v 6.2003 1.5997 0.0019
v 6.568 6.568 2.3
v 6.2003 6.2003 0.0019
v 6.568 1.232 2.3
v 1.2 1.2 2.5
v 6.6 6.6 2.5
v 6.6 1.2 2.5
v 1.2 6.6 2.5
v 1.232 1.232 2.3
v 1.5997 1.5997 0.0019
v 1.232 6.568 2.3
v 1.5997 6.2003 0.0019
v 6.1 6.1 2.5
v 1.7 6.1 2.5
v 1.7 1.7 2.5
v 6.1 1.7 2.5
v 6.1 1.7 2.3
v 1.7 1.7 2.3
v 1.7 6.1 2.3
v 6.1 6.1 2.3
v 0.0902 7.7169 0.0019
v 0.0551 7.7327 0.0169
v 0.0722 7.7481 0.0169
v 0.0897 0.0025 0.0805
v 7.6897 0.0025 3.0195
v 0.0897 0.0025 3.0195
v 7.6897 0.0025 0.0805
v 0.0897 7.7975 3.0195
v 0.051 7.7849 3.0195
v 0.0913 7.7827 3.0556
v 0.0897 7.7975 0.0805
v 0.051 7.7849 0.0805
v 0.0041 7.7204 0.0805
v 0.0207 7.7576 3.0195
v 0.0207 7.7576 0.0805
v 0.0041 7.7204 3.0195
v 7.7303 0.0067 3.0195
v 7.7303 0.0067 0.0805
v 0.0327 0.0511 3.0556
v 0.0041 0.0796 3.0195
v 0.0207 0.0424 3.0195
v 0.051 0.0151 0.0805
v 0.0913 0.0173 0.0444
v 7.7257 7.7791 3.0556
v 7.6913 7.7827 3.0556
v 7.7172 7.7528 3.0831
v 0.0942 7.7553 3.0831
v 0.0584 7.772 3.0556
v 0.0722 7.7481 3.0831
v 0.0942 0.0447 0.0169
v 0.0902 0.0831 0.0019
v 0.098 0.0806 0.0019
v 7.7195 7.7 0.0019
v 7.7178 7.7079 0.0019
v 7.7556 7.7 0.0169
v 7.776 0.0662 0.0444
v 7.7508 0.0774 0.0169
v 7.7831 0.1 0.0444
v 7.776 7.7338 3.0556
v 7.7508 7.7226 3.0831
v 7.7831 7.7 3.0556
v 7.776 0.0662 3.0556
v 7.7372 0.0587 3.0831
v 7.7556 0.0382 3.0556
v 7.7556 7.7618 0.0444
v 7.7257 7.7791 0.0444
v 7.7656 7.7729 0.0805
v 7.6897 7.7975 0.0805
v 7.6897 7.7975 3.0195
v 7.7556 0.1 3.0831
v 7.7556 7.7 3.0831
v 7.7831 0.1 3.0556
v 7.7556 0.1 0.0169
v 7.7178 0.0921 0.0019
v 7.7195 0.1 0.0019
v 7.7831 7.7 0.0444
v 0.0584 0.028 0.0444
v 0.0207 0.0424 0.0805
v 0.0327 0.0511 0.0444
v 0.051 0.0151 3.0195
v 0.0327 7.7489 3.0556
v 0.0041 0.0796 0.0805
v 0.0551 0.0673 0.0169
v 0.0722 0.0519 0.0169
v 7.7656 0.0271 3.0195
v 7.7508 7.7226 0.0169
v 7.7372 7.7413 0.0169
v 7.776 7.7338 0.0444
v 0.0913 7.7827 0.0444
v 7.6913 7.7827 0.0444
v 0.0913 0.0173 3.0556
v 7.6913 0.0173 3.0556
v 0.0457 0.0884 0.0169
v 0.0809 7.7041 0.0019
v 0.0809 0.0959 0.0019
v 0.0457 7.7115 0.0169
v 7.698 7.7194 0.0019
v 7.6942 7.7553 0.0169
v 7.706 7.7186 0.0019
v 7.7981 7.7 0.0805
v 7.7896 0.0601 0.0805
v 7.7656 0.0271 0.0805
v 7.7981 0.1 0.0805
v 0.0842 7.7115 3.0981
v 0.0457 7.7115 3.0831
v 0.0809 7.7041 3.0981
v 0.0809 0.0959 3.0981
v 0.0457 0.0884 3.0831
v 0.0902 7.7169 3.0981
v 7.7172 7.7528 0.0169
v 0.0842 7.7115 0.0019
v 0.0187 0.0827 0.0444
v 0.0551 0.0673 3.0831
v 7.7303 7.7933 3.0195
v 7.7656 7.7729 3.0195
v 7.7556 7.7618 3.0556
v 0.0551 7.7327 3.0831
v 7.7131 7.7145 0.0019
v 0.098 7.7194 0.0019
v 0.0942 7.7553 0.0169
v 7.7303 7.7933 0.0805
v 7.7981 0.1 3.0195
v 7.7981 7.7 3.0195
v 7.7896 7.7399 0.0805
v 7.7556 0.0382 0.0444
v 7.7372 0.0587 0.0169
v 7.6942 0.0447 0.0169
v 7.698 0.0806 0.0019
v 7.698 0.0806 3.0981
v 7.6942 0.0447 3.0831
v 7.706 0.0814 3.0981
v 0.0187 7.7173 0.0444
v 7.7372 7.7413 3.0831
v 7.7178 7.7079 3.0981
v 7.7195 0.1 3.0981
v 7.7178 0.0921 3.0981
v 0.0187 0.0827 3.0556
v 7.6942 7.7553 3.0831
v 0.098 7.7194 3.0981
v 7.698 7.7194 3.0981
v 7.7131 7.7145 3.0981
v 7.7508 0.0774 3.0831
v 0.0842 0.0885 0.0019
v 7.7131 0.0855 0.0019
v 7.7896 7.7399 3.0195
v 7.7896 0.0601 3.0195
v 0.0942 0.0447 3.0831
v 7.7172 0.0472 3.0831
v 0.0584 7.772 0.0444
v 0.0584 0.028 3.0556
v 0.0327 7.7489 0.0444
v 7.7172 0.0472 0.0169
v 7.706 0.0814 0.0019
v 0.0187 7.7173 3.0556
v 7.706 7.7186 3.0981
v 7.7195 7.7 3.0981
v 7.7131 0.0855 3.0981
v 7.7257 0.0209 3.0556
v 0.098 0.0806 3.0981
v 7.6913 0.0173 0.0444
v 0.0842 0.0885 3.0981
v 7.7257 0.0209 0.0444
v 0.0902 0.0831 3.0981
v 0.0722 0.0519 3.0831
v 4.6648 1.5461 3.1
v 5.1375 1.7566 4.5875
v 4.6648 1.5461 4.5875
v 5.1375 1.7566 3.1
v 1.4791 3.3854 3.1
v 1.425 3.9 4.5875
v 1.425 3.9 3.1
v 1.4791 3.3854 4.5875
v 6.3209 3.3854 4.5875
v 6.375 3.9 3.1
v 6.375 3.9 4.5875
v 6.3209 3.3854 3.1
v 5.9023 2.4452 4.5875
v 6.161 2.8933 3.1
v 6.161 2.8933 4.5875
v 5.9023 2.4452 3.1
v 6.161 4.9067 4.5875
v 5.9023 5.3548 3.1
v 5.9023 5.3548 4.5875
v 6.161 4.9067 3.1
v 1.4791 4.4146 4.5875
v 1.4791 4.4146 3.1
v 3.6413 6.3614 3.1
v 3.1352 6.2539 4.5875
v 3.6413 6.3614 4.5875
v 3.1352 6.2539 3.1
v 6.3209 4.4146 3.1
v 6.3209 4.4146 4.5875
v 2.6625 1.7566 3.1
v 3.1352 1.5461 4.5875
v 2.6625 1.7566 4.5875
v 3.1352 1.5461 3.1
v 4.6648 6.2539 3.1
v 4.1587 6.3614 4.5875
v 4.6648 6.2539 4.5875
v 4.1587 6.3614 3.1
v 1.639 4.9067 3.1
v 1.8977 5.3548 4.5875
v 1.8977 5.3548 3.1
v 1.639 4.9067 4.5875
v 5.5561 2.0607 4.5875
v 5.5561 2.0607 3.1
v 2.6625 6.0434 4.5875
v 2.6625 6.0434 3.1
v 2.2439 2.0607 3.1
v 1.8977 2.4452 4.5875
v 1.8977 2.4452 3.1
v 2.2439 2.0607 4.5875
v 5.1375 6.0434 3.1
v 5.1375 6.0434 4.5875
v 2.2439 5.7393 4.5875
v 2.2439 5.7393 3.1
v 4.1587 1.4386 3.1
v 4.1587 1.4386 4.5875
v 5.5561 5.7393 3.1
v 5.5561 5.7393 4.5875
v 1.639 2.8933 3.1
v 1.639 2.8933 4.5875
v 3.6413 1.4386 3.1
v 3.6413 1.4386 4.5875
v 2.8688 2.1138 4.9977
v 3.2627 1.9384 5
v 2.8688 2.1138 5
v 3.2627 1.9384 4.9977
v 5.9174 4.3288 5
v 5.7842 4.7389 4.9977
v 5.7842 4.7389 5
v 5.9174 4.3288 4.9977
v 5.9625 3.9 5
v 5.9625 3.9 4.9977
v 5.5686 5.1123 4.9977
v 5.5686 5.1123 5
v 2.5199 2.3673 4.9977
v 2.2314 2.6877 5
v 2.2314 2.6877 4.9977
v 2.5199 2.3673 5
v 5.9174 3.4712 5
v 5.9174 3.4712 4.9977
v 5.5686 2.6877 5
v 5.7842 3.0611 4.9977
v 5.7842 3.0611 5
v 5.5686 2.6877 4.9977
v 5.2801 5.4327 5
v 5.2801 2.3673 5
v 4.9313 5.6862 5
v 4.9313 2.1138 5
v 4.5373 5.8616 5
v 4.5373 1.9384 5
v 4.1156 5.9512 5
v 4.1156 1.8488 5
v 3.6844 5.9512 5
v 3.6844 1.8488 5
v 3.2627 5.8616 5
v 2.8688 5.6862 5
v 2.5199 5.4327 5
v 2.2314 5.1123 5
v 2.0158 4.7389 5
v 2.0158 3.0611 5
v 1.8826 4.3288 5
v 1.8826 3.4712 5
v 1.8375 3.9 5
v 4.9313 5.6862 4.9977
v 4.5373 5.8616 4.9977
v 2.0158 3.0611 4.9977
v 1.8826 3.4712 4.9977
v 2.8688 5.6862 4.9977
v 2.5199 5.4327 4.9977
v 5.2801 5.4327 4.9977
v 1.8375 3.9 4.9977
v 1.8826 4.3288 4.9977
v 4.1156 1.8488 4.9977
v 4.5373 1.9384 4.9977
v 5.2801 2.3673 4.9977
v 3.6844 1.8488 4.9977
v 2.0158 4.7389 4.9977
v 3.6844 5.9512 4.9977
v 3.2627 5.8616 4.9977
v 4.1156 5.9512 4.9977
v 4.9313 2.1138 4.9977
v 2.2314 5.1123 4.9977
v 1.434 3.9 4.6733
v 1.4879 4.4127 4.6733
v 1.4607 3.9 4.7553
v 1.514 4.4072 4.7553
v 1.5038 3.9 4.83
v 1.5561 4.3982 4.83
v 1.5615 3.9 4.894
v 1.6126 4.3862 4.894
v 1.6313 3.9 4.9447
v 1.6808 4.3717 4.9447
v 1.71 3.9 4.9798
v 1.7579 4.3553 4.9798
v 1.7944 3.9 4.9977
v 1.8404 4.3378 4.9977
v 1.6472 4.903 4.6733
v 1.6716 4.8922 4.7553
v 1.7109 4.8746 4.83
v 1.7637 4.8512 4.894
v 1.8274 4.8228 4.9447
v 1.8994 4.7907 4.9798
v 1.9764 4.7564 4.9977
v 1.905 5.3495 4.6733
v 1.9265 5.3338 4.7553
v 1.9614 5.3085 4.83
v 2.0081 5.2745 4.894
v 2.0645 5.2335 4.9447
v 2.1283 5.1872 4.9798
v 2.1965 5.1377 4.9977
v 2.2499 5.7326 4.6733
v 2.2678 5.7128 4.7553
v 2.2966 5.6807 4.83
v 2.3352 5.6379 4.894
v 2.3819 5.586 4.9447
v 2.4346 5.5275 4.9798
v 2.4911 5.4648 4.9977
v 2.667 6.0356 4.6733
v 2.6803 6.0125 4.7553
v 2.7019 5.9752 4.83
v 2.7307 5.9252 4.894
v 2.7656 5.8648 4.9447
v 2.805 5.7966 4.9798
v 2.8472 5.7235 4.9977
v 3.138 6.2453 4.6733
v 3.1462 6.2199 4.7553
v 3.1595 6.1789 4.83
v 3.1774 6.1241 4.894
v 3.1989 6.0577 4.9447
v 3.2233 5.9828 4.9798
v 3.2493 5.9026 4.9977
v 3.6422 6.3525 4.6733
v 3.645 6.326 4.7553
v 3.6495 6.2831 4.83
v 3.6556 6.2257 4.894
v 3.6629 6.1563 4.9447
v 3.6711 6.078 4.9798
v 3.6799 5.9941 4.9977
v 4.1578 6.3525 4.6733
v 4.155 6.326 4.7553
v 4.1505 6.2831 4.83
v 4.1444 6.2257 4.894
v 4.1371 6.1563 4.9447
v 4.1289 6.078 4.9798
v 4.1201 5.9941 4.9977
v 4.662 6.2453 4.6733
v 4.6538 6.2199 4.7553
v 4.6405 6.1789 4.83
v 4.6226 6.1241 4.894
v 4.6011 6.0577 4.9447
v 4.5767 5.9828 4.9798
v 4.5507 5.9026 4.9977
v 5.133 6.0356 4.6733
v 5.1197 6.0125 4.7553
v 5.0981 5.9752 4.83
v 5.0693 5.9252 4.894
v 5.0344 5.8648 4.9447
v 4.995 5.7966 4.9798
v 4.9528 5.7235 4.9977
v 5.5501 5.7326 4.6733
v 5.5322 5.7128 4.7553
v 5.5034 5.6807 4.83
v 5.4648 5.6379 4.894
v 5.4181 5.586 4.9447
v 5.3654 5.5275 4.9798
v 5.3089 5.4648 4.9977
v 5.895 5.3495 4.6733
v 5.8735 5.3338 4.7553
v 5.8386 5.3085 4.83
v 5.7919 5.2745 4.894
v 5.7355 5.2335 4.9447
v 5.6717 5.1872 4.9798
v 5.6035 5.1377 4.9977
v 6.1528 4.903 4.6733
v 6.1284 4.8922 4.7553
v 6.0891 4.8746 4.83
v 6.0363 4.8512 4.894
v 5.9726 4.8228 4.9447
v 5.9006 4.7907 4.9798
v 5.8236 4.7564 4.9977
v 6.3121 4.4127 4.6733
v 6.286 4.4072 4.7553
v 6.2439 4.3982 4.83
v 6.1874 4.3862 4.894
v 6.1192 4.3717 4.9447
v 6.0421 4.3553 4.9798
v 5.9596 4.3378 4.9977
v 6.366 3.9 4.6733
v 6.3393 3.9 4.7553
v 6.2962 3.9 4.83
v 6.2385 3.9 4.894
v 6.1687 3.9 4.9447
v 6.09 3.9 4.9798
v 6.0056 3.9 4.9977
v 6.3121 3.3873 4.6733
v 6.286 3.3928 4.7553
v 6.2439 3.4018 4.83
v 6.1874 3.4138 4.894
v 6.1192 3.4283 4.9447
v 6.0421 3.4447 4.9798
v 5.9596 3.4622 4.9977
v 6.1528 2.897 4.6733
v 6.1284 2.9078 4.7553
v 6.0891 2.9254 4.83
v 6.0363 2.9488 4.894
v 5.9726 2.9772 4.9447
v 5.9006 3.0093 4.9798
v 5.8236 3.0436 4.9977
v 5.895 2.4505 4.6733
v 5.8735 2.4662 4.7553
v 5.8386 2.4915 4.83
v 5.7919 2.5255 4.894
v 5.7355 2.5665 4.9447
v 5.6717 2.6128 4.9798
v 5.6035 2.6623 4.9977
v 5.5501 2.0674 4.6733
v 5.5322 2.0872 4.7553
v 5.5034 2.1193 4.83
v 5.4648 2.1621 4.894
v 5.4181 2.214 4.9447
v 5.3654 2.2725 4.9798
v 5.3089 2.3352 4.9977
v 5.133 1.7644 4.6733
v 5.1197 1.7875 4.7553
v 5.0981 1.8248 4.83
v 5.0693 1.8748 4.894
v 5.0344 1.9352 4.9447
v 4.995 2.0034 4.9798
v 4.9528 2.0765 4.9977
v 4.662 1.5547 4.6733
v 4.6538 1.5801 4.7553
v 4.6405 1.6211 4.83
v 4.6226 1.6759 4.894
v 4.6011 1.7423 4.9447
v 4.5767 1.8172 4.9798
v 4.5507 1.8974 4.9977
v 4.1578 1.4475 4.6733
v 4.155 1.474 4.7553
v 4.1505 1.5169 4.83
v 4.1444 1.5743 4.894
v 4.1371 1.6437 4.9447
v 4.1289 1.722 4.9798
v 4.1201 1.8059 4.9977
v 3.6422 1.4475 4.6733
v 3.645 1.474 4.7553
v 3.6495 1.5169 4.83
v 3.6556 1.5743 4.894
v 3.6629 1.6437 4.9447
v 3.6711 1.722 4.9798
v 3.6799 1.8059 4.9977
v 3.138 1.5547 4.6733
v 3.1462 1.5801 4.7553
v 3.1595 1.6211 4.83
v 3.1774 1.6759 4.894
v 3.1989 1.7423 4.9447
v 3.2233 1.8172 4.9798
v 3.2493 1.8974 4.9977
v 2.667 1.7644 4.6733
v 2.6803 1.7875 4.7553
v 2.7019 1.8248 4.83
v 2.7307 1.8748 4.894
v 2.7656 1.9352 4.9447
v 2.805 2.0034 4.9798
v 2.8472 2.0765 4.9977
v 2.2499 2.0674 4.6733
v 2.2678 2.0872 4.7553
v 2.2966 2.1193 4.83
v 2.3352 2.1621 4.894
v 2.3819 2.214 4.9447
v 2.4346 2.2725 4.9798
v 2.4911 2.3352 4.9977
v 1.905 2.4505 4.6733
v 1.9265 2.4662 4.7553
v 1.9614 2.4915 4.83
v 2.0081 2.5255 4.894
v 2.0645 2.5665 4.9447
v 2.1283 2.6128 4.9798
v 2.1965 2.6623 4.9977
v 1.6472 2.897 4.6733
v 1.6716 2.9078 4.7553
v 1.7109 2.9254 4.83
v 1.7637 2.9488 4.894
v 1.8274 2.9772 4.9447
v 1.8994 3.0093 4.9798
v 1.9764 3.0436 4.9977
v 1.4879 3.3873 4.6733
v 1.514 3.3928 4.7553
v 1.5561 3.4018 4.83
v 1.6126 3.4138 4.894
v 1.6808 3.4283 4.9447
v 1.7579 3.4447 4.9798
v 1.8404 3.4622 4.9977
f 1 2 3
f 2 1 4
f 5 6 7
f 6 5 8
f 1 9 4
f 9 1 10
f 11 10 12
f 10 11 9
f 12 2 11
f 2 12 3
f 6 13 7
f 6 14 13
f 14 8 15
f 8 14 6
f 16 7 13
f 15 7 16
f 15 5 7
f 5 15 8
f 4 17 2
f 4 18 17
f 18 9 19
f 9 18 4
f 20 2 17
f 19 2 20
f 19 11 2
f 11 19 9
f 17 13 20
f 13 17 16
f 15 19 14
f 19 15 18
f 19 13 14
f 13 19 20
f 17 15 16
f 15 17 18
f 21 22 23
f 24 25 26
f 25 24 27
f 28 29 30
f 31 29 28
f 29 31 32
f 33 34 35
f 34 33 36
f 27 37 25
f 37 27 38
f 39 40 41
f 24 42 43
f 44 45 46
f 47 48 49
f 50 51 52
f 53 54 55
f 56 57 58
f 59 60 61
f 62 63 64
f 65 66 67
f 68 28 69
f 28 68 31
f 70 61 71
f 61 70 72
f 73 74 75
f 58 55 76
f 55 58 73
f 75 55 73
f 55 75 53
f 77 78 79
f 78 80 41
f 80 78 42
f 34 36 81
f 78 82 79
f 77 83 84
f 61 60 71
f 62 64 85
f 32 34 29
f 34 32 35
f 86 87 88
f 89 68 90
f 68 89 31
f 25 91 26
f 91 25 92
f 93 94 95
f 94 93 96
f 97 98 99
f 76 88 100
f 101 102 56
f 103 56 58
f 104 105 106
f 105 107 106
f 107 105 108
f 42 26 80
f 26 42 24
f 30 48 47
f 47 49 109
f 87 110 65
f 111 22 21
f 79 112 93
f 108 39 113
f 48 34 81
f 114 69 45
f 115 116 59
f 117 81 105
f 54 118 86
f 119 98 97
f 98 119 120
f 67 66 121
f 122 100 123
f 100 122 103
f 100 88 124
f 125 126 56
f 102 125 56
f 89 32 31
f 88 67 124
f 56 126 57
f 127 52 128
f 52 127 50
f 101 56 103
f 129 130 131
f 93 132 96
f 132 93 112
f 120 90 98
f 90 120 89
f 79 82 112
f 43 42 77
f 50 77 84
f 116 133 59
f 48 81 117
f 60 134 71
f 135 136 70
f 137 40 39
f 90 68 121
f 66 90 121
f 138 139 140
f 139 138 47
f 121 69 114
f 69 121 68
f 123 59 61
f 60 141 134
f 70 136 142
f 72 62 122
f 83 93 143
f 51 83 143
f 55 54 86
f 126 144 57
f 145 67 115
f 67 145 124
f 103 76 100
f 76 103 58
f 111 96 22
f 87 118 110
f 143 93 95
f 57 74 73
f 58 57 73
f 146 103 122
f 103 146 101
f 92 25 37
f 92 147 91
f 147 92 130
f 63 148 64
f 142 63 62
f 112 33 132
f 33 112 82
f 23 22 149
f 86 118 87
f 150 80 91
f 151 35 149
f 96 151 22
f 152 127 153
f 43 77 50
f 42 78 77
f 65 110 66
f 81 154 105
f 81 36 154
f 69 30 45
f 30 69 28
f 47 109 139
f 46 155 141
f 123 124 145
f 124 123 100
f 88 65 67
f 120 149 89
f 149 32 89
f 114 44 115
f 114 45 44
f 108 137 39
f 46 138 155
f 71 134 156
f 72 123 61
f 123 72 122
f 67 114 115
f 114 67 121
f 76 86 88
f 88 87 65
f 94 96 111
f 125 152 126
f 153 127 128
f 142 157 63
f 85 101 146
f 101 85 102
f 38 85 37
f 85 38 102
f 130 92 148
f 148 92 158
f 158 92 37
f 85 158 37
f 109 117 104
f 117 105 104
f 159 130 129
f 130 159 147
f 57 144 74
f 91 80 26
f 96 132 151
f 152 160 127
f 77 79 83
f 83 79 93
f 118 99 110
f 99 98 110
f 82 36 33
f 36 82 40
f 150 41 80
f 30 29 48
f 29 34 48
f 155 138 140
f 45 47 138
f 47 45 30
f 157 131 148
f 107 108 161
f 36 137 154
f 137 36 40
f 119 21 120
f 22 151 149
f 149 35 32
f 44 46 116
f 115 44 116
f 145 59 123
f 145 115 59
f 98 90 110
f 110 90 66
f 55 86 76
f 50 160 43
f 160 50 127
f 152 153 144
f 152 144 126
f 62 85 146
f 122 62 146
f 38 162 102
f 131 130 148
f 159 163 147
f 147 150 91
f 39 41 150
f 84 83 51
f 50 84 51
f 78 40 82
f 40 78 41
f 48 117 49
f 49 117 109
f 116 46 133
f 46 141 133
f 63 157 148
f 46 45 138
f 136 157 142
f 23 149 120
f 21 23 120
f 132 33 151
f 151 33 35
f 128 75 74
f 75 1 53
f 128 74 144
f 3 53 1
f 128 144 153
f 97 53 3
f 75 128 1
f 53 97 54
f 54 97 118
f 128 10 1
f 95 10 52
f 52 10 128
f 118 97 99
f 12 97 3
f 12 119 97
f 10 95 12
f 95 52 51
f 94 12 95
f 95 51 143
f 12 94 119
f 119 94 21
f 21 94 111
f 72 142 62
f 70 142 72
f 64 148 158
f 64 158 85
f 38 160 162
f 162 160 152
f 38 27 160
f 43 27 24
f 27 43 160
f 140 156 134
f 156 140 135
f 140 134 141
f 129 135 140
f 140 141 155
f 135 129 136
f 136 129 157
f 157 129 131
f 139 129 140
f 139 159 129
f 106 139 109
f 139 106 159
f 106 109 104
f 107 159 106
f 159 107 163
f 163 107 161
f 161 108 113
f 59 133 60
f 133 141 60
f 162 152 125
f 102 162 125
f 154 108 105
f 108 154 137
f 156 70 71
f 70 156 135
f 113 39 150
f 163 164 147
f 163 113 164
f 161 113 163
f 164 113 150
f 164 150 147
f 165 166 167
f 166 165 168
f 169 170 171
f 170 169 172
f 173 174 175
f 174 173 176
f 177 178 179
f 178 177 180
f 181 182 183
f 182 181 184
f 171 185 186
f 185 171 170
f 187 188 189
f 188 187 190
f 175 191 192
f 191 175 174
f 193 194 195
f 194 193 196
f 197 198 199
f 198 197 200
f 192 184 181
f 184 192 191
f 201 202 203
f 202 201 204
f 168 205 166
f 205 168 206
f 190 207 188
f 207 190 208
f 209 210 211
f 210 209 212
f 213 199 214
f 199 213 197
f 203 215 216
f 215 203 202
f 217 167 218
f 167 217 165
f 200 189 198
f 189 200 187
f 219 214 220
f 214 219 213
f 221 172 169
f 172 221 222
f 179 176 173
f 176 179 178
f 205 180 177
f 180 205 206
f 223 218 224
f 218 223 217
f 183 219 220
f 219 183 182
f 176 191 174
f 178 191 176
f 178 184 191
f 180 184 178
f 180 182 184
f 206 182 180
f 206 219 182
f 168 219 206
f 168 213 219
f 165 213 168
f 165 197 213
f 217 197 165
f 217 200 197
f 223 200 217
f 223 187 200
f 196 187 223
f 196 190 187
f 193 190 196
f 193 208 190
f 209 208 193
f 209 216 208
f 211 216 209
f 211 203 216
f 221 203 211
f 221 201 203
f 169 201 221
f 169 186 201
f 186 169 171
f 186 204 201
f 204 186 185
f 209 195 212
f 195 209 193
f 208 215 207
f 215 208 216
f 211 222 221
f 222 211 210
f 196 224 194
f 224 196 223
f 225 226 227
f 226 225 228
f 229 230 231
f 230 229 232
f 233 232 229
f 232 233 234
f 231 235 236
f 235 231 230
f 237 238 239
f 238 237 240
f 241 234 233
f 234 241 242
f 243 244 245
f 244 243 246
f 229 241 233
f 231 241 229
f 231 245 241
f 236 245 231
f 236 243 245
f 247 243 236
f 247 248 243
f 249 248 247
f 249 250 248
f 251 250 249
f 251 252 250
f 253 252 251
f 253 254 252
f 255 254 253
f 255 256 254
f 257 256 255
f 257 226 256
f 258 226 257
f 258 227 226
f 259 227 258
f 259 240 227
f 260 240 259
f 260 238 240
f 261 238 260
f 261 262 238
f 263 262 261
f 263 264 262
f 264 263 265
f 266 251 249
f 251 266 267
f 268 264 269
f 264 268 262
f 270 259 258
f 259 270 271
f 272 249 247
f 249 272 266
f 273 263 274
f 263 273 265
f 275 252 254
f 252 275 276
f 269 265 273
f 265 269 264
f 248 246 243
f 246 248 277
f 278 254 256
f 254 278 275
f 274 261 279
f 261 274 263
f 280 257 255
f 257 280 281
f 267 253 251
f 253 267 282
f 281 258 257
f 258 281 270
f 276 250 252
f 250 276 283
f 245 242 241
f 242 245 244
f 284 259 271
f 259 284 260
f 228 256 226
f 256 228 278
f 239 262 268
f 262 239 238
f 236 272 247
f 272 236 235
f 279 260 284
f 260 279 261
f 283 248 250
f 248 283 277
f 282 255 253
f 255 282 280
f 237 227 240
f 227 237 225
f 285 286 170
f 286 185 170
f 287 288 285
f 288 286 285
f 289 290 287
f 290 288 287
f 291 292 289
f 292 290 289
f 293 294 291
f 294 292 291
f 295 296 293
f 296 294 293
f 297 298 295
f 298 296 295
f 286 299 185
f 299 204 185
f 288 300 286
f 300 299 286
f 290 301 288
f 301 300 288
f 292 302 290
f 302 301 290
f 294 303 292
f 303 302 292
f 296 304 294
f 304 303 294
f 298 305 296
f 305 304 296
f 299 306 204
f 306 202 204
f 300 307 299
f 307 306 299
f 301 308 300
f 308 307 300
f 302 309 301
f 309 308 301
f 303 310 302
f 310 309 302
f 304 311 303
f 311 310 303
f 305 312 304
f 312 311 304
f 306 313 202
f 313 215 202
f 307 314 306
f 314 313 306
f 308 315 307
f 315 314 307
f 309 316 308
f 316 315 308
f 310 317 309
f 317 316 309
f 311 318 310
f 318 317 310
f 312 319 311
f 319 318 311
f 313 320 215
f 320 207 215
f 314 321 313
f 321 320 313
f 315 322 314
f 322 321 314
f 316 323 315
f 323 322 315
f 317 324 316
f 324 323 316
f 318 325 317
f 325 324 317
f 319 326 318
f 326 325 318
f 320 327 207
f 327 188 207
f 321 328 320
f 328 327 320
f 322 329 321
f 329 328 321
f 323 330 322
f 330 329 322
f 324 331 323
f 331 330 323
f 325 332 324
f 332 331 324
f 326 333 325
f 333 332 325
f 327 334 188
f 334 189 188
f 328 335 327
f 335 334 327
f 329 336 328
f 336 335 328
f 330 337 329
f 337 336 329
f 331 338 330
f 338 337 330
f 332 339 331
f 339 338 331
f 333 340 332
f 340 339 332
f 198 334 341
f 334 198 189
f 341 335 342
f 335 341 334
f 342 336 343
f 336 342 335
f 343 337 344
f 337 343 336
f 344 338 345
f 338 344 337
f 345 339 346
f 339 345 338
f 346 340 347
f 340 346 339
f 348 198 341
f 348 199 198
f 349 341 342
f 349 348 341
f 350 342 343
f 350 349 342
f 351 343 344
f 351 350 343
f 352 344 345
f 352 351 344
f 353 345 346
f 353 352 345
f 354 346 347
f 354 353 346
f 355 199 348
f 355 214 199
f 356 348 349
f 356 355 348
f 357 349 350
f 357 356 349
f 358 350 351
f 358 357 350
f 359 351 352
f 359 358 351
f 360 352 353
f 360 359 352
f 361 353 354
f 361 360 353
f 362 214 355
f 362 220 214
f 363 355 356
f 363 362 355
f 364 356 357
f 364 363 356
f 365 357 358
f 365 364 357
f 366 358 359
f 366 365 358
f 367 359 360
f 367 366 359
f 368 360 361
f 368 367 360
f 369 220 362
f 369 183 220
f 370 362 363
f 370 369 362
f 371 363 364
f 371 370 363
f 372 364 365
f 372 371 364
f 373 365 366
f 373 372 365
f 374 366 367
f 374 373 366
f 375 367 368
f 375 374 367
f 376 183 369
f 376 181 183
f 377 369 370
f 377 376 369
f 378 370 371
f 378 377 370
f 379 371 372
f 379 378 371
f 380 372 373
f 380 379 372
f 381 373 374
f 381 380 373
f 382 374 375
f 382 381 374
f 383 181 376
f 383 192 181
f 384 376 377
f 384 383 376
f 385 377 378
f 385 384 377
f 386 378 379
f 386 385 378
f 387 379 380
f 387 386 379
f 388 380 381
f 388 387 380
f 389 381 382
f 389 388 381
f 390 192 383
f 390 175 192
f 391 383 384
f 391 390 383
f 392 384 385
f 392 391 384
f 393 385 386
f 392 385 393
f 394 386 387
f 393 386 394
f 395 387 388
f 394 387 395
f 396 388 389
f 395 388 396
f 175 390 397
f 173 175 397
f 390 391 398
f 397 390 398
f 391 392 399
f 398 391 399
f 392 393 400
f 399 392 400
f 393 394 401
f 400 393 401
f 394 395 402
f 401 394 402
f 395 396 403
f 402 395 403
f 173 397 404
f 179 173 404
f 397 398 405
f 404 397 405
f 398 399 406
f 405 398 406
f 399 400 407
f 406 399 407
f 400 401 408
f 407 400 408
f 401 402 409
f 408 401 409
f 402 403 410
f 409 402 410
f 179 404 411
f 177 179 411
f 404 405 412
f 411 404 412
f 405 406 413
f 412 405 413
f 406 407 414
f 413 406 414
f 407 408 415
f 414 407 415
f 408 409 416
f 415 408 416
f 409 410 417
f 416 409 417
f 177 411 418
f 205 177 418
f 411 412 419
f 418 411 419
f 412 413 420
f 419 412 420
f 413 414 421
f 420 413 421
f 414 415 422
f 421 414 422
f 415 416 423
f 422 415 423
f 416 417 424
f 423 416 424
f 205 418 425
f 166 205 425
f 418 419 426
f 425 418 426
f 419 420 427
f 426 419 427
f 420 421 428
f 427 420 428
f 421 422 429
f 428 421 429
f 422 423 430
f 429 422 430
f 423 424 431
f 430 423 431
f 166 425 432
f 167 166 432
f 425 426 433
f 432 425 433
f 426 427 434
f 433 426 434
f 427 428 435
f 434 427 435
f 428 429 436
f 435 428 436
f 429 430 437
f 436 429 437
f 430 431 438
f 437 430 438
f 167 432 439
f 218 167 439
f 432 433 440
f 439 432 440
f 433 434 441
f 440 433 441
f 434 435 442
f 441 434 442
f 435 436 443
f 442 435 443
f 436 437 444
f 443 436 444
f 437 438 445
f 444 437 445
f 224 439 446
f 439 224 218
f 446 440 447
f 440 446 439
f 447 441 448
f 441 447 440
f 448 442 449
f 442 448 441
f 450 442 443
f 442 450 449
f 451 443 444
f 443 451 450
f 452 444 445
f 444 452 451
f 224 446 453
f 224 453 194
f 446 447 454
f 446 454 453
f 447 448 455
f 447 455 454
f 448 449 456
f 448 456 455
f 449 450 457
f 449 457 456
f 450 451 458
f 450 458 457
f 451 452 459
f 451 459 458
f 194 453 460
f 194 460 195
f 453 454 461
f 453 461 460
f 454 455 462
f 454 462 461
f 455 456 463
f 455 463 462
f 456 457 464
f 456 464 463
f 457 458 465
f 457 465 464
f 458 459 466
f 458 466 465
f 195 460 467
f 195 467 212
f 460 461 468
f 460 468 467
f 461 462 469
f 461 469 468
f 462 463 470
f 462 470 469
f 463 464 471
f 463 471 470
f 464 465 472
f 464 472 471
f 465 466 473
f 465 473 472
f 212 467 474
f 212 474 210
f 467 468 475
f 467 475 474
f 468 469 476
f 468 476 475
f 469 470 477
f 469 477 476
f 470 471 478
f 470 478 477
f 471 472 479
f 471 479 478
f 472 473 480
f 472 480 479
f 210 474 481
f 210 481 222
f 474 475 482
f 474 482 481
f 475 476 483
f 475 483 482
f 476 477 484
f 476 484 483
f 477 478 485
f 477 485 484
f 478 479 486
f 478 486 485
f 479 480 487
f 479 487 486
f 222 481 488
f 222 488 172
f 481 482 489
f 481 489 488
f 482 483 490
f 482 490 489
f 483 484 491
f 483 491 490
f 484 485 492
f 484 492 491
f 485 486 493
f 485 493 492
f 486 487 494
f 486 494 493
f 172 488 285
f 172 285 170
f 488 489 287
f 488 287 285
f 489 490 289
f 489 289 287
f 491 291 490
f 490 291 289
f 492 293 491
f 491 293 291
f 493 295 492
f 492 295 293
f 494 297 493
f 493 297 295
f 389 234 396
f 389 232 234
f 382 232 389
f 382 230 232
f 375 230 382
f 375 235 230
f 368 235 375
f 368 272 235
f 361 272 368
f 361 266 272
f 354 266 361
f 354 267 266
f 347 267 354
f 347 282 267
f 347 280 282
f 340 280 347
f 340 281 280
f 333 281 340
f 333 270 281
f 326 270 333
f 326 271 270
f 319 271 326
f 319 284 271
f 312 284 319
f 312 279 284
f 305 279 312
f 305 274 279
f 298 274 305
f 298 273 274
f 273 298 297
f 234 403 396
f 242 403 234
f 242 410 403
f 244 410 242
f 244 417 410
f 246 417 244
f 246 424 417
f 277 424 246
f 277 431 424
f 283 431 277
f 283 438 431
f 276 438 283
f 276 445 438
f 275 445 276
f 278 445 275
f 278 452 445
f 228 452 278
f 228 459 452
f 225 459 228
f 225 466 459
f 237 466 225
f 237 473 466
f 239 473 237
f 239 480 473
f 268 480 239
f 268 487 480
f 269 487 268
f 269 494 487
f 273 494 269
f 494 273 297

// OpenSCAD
// file: ../../lib/brick-hollow.scad
/**
* Machine Blocks
* https://machinemania.net/blocks 
*
* Brick Hollow
* Copyright (c) 2022 Jan Philipp Knoeller <pk@pksoftware.de>
*
* Published under license:
* Creative Commons Attribution-NonCommercial-ShareAlike 4.0 International 
* https://creativecommons.org/licenses/by-nc-sa/4.0/
*
*/
echo(version=version());

module brickHollow(height=9.3, fade=2.5, minSize=[4.6,4.6], maxSize=[5.2, 5.2], center = false){
    echo(height, minSize, maxSize, fade);
    sizeX = max(minSize[0],maxSize[0]); 
   sizeY = max(minSize[1],maxSize[1]); 
    
    posX = center ? 0 : 0.5*sizeX; 
   posY = center ? 0 : 0.5*sizeY;   
   posZ = center ? -0.5 * (height-fade) : 0.5*fade;
    
    cutHelper = 0.2;
    overlapSpace=0.1;
    
    translate([posX, posY, posZ]){
        union(){
            polyhedron(points=[
                [-0.5*minSize[0],-0.5*minSize[1],-0.5*fade],
                [0.5*minSize[0],-0.5*minSize[1],-0.5*fade],
                [0.5*minSize[0],0.5*minSize[1],-0.5*fade],
                [-0.5*minSize[0],0.5*minSize[1],-0.5*fade],
                [-0.5*maxSize[0],-0.5*maxSize[1],0.5*fade],
                [0.5*maxSize[0],-0.5*maxSize[1],0.5*fade],
                [0.5*maxSize[0],0.5*maxSize[1],0.5*fade],
                [-0.5*maxSize[0],0.5*maxSize[1],0.5*fade]
            ], faces=[[0,1,2,3],[1,0,4,5],[2,1,5,6],[3,2,6,7],[0,3,7,4],[7,6,5,4]]);
            
            if(height > fade){
                translate([0,0,0.5*height - overlapSpace]){
                    cube([maxSize[0], maxSize[1], height - fade + overlapSpace], center=true);
                }
            }
            
            translate([0,0,-0.5*(fade + cutHelper) + overlapSpace]){
                cube([minSize[0], minSize[1], cutHelper + overlapSpace], center=true);
            }
        }
    }
}

//brickHollow(height=9.3, maxSize=[5.2,5.2], minSize=[4.6,4.6], center=true);
// file: ../../lib/roundedcube_simple.scad
/**
* Machine Blocks
* https://machinemania.net/blocks 
*
* Module for simple rounded cubes
* Copyright (c) 2022 Jan Philipp Knoeller <pk@pksoftware.de>
*
* Published under license:
* Creative Commons Attribution-NonCommercial-ShareAlike 4.0 International 
* https://creativecommons.org/licenses/by-nc-sa/4.0/
*
*/
module roundedcube_simple(size = [1, 1, 1], center = false, radius = 0.5, resolution = 20) {
	// If single value, convert to [x, y, z] vector
	size = (size[0] == undef) ? [size, size, size] : size;

	translate = (center == false) ?
		[radius, radius, radius] :
		[
			radius - (size[0] / 2),
			radius - (size[1] / 2),
			radius - (size[2] / 2)
	];

	translate(v = translate)
	minkowski() {
		cube(size = [
			size[0] - (radius * 2),
			size[1] - (radius * 2),
			size[2] - (radius * 2)
		]);
		sphere(r = radius, $fn = resolution);
	}
}
// file: ../../lib/roundedcube.scad
// More information: https://danielupshaw.com/openscad-rounded-corners/

// Set to 0.01 for higher definition curves (renders slower)
$fs = 0.15;

module roundedcube(size = [1, 1, 1], center = false, radius = 0.5, apply_to = "all", resolution = 20) {
	// If single value, convert to [x, y, z] vector
	size = (size[0] == undef) ? [size, size, size] : size;

	translate_min = radius;
	translate_xmax = size[0] - radius;
	translate_ymax = size[1] - radius;
	translate_zmax = size[2] - radius;

	diameter = radius * 2;

	obj_translate = (center == false) ?
		[0, 0, 0] : [
			-(size[0] / 2),
			-(size[1] / 2),
			-(size[2] / 2)
		];

	translate(v = obj_translate) {
		hull() {
			for (translate_x = [translate_min, translate_xmax]) {
				x_at = (translate_x == translate_min) ? "min" : "max";
				for (translate_y = [translate_min, translate_ymax]) {
					y_at = (translate_y == translate_min) ? "min" : "max";
					for (translate_z = [translate_min, translate_zmax]) {
						z_at = (translate_z == translate_min) ? "min" : "max";

						translate(v = [translate_x, translate_y, translate_z])
						if (
							(apply_to == "all") ||
							(apply_to == "xmin" && x_at == "min") || (apply_to == "xmax" && x_at == "max") ||
							(apply_to == "ymin" && y_at == "min") || (apply_to == "ymax" && y_at == "max") ||
							(apply_to == "zmin" && z_at == "min") || (apply_to == "zmax" && z_at == "max")
						) {
							sphere(r = radius, $fn = resolution);
						} else {
							rotate = 
								(apply_to == "xmin" || apply_to == "xmax" || apply_to == "x") ? [0, 90, 0] : (
								(apply_to == "ymin" || apply_to == "ymax" || apply_to == "y") ? [90, 90, 0] :
								[0, 0, 0]
							);
							rotate(a = rotate)
							cylinder(h = diameter, r = radius, center = true, $fn = resolution);
						}
					}
				}
			}
		}
	}
}
// main file
/**
* Machine Blocks
* https://machinemania.net/blocks 
*
* Plate 1x1
* Copyright (c) 2022 Jan Philipp Knoeller <pk@pksoftware.de>
*
* Published under license:
* Creative Commons Attribution-NonCommercial-ShareAlike 4.0 International 
* https://creativecommons.org/licenses/by-nc-sa/4.0/
*
*/
echo(version=version());

include <../../lib/block-v2.scad>;

block(grid=[1,1]);
